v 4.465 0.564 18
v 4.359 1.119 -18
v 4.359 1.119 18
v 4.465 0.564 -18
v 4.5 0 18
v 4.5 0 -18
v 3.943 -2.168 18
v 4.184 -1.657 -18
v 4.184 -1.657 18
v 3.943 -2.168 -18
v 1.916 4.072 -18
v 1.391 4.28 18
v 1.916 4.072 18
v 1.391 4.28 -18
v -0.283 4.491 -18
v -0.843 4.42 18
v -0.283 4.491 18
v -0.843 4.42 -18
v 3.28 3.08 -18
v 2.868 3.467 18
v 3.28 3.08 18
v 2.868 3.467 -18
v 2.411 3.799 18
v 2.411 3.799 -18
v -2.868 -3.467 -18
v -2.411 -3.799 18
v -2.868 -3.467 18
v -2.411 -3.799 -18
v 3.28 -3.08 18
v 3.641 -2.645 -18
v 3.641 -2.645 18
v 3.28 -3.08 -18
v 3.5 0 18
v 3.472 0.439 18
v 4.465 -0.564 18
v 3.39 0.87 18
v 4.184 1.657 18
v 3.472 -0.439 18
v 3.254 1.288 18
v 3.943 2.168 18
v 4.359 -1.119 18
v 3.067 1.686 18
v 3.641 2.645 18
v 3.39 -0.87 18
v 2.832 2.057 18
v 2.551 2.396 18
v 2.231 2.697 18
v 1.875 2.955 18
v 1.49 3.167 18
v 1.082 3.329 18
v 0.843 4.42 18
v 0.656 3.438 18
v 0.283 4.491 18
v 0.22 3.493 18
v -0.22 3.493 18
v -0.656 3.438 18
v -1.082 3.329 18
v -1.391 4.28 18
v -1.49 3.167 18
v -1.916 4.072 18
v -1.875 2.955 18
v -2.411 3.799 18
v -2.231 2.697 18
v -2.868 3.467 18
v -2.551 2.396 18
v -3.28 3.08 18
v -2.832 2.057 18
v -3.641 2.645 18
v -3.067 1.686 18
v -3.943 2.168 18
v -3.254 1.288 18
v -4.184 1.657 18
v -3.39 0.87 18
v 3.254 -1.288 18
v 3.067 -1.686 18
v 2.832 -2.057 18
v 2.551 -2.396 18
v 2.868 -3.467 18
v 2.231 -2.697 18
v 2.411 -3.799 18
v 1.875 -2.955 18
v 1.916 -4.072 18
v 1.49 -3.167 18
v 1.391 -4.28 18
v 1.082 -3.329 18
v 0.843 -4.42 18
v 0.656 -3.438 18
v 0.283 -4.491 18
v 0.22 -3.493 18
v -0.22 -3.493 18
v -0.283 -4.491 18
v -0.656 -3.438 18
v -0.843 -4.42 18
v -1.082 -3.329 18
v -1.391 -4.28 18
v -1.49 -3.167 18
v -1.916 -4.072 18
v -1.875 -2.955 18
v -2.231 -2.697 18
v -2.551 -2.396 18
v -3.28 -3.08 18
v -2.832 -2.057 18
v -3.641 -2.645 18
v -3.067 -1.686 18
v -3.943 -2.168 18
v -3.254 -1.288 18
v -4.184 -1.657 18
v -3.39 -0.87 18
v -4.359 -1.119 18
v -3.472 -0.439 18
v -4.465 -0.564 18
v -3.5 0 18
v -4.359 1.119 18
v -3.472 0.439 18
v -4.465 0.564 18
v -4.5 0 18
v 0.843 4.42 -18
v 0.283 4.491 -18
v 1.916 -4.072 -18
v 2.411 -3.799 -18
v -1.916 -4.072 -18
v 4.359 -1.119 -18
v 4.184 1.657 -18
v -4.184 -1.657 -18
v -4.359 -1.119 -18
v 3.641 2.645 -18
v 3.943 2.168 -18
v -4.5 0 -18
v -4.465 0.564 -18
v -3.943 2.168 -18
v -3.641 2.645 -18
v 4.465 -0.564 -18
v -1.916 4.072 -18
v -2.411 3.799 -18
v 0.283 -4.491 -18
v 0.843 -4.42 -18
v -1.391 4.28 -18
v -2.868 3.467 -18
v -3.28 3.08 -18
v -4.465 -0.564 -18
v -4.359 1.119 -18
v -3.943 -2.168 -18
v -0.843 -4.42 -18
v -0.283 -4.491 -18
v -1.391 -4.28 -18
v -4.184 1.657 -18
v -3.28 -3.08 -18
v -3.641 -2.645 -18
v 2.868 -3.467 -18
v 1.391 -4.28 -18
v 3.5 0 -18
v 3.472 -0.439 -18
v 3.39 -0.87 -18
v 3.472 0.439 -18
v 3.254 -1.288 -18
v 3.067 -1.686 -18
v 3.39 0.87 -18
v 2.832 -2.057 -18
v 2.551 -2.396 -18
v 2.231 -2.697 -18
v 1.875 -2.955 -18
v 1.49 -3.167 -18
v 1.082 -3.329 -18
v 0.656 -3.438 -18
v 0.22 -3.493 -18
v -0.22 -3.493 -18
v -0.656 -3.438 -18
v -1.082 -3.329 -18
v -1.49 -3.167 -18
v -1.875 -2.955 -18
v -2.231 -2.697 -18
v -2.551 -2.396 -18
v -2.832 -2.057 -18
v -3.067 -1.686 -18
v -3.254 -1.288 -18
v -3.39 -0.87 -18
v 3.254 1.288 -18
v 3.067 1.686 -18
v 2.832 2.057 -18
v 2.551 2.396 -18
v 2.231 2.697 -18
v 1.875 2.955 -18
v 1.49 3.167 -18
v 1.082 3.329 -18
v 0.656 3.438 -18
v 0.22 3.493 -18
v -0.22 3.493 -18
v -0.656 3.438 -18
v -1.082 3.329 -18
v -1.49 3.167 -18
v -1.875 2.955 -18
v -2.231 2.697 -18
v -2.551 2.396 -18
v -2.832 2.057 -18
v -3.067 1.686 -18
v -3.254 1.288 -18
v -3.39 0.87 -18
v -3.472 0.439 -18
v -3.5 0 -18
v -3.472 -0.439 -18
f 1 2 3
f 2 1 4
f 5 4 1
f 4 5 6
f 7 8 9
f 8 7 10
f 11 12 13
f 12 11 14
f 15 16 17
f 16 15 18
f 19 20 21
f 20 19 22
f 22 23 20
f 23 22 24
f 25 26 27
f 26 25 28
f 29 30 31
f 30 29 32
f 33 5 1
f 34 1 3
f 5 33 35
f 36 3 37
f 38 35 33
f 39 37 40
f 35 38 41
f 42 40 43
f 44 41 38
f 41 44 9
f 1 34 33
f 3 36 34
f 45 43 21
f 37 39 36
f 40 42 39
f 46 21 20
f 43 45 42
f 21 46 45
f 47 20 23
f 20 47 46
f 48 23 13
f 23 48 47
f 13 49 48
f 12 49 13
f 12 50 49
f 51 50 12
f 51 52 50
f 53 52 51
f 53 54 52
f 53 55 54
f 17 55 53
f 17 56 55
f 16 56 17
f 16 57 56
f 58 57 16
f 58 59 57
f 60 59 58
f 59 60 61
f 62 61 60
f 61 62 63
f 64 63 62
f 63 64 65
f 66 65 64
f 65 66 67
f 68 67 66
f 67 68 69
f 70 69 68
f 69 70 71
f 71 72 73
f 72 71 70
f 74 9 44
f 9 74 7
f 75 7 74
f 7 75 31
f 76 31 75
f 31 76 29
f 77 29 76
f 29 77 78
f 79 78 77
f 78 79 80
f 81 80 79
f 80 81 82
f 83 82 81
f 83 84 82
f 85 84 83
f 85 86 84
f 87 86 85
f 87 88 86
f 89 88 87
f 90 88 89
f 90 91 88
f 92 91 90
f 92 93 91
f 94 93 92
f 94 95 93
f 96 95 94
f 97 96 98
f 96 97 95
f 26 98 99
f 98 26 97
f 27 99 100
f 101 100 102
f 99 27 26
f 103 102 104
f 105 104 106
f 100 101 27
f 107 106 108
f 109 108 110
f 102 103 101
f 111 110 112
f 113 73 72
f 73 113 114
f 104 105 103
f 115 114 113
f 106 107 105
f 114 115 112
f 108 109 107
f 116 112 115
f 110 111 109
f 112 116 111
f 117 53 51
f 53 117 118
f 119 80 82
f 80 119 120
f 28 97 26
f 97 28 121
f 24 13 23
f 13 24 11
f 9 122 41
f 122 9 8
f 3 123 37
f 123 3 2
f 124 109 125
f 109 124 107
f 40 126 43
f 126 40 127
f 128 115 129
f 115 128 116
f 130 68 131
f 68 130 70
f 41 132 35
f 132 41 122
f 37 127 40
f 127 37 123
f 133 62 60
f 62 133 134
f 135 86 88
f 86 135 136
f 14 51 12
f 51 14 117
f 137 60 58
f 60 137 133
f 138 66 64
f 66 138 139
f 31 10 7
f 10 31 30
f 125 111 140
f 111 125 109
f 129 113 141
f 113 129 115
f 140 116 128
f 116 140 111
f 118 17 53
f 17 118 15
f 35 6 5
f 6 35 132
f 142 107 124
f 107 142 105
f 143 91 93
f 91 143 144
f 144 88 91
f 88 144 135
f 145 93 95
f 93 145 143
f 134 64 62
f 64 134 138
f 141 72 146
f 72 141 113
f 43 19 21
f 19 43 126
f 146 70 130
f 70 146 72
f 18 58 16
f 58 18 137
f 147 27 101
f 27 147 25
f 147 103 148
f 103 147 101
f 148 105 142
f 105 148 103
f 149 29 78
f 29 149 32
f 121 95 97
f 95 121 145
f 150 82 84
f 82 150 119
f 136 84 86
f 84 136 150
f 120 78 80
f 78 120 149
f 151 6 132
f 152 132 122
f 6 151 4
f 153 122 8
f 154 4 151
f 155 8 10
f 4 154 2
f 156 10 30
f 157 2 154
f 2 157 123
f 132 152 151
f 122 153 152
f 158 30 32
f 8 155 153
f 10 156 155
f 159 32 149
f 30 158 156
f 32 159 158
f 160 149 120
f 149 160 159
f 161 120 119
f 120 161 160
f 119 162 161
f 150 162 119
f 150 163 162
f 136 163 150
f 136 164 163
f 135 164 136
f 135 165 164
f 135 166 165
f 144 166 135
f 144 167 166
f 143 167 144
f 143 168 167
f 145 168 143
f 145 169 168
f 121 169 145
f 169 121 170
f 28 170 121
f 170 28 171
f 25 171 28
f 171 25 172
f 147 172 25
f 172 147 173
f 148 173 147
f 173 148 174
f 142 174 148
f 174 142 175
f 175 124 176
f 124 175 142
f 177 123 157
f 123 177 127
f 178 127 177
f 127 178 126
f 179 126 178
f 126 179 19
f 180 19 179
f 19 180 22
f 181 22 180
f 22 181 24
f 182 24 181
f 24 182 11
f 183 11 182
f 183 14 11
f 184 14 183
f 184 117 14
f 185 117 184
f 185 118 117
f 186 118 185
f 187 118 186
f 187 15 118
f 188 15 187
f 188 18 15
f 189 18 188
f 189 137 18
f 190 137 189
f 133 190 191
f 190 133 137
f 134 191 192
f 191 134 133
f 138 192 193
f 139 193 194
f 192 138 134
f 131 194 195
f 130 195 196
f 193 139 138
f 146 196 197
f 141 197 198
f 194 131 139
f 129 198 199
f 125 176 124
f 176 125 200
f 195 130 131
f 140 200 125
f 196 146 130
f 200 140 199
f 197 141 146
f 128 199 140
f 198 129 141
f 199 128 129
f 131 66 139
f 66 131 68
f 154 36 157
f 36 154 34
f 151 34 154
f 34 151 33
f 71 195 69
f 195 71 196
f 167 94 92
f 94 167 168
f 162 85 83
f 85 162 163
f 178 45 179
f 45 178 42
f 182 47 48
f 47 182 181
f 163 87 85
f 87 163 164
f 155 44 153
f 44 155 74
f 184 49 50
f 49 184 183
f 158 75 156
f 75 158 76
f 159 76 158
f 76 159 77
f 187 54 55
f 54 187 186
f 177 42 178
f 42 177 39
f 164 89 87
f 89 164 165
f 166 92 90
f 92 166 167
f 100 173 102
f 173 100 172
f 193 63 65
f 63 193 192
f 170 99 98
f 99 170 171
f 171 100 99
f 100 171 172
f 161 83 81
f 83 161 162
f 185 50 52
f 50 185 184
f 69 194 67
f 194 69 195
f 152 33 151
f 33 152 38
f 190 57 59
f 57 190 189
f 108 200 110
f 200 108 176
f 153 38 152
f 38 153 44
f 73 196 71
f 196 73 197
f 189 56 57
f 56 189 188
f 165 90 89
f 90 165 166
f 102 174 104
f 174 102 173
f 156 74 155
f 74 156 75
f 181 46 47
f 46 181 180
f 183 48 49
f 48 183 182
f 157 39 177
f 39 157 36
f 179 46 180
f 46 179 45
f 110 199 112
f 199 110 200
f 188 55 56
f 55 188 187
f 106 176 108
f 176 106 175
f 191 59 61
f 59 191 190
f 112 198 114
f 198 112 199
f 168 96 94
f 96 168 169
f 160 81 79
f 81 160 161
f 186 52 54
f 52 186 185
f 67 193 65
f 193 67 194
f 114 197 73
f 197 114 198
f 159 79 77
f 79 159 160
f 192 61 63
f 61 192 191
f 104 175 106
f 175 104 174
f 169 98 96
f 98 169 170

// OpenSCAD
$fn = 50;


difference() {
	union() {
		translate(v = [0, 0, -18.0000000000]) {
			cylinder(h = 36, r = 4.5000000000);
		}
	}
	union() {
		translate(v = [0, 0, -100.0000000000]) {
			cylinder(h = 200, r = 3.5000000000);
		}
	}
}
